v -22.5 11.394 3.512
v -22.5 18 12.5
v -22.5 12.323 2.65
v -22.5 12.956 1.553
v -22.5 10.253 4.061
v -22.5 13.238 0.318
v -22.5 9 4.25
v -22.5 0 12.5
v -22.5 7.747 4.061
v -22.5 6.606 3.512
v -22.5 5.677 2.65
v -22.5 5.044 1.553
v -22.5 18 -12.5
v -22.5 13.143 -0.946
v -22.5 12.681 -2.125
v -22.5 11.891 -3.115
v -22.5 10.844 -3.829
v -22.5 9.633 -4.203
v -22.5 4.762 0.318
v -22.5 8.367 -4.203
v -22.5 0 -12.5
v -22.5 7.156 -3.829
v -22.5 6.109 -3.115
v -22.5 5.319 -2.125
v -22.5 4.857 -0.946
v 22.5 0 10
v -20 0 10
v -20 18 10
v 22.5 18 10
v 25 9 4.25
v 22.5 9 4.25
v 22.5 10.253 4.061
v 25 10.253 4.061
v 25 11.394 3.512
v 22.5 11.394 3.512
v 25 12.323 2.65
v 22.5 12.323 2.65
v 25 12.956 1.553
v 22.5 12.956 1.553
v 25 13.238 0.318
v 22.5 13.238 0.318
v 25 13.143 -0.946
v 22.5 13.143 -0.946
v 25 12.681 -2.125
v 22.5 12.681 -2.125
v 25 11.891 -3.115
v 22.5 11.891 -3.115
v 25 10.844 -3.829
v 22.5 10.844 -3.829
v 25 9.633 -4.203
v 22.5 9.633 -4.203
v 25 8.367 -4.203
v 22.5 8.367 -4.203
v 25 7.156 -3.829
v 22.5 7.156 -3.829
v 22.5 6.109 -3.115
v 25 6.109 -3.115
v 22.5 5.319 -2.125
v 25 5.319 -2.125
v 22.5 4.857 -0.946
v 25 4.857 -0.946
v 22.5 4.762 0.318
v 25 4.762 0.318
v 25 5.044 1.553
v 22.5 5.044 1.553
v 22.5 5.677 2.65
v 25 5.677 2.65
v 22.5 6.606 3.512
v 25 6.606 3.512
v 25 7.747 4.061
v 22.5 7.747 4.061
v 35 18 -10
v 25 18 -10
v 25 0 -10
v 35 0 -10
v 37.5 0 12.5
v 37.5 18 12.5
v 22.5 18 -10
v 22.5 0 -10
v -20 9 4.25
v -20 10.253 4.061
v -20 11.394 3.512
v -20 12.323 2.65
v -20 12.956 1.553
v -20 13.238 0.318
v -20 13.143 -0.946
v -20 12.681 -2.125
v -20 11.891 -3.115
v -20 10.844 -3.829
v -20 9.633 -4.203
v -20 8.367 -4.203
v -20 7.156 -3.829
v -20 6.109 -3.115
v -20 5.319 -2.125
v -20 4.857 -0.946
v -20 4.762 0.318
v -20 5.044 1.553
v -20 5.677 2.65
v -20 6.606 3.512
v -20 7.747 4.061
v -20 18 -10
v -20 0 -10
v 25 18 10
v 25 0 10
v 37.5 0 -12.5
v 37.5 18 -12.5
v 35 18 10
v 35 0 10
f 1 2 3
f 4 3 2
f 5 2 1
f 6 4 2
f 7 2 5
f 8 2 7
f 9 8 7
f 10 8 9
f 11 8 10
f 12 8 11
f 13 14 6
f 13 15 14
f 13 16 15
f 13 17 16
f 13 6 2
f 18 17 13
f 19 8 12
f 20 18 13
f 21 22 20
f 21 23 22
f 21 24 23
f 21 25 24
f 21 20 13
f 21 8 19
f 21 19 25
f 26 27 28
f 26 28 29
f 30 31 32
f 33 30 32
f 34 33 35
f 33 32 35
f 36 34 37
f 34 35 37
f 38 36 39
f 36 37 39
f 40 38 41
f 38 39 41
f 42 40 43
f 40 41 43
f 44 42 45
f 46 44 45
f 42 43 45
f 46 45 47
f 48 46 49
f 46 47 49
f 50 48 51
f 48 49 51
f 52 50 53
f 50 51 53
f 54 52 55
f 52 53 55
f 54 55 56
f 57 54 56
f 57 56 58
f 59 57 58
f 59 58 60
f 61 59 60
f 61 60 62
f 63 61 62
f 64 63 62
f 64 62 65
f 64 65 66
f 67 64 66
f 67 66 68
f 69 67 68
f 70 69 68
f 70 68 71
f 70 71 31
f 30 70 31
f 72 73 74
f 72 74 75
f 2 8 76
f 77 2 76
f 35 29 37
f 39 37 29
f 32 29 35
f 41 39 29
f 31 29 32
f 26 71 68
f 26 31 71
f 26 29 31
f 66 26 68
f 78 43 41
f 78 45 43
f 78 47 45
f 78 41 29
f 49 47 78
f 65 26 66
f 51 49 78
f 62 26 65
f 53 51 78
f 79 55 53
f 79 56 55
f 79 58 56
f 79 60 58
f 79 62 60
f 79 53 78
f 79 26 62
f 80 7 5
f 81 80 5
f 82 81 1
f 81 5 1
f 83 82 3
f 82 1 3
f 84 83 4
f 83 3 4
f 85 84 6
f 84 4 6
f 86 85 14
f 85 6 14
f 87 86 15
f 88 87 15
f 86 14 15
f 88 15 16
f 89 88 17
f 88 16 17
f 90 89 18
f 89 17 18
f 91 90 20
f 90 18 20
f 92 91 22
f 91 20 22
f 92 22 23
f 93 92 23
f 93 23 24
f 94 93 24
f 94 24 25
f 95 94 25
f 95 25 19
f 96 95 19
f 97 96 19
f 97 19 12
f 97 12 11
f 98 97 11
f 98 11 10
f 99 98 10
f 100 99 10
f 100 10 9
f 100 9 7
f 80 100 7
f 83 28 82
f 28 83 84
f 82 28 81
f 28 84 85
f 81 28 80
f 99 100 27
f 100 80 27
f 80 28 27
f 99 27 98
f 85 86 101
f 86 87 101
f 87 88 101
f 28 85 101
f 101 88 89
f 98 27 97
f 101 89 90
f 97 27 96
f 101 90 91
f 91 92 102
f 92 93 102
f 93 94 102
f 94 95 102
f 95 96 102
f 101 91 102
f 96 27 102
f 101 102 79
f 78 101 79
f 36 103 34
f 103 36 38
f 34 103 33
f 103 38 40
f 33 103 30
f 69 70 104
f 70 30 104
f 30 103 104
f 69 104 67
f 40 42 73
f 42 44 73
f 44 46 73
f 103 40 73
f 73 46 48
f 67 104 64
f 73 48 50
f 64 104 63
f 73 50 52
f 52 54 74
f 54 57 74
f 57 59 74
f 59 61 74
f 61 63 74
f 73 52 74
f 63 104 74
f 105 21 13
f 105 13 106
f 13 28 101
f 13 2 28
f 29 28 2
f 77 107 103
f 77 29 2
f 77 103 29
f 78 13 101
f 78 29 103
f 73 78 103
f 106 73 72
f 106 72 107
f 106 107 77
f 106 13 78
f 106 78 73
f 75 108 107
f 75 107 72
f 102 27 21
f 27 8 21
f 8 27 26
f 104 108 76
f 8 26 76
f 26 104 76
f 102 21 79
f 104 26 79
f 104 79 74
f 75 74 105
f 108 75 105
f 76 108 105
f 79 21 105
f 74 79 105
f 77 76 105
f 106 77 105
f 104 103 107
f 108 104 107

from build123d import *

# Parameters (mm, degrees)
SKETCH1_W           = 60
SKETCH1_H           = 25
SKETCH1_W_2         = 42.5
SKETCH1_H_2         = 20
SKETCH1_W_3         = 10
BOSS_EXTRUDE1_DEPTH = 18
SKETCH3_R           = 4.25
CUT_EXTRUDE1_DEPTH  = 47.5


with BuildPart() as part:
    # Sketch1 → Boss-Extrude1 (new body)
    with BuildSketch(Plane(origin=(0, 0, 0), x_dir=(1, 0, 0), z_dir=(0, 1, 0))):
        with Locations((7.5, 0)):
            Rectangle(SKETCH1_W, SKETCH1_H)
        with Locations((1.25, 0)):
            Rectangle(SKETCH1_W_2, SKETCH1_H_2, mode=Mode.SUBTRACT)
        with Locations((30, 0)):
            Rectangle(SKETCH1_W_3, SKETCH1_H_2, mode=Mode.SUBTRACT)
    extrude(amount=BOSS_EXTRUDE1_DEPTH)

    # Sketch3 → Cut-Extrude1 (cut)
    with BuildSketch(Plane.ZY.offset(22.5)):
        with Locations((0, 9)):
            Circle(SKETCH3_R)
    extrude(amount=-CUT_EXTRUDE1_DEPTH, mode=Mode.SUBTRACT)


solid = part.part
